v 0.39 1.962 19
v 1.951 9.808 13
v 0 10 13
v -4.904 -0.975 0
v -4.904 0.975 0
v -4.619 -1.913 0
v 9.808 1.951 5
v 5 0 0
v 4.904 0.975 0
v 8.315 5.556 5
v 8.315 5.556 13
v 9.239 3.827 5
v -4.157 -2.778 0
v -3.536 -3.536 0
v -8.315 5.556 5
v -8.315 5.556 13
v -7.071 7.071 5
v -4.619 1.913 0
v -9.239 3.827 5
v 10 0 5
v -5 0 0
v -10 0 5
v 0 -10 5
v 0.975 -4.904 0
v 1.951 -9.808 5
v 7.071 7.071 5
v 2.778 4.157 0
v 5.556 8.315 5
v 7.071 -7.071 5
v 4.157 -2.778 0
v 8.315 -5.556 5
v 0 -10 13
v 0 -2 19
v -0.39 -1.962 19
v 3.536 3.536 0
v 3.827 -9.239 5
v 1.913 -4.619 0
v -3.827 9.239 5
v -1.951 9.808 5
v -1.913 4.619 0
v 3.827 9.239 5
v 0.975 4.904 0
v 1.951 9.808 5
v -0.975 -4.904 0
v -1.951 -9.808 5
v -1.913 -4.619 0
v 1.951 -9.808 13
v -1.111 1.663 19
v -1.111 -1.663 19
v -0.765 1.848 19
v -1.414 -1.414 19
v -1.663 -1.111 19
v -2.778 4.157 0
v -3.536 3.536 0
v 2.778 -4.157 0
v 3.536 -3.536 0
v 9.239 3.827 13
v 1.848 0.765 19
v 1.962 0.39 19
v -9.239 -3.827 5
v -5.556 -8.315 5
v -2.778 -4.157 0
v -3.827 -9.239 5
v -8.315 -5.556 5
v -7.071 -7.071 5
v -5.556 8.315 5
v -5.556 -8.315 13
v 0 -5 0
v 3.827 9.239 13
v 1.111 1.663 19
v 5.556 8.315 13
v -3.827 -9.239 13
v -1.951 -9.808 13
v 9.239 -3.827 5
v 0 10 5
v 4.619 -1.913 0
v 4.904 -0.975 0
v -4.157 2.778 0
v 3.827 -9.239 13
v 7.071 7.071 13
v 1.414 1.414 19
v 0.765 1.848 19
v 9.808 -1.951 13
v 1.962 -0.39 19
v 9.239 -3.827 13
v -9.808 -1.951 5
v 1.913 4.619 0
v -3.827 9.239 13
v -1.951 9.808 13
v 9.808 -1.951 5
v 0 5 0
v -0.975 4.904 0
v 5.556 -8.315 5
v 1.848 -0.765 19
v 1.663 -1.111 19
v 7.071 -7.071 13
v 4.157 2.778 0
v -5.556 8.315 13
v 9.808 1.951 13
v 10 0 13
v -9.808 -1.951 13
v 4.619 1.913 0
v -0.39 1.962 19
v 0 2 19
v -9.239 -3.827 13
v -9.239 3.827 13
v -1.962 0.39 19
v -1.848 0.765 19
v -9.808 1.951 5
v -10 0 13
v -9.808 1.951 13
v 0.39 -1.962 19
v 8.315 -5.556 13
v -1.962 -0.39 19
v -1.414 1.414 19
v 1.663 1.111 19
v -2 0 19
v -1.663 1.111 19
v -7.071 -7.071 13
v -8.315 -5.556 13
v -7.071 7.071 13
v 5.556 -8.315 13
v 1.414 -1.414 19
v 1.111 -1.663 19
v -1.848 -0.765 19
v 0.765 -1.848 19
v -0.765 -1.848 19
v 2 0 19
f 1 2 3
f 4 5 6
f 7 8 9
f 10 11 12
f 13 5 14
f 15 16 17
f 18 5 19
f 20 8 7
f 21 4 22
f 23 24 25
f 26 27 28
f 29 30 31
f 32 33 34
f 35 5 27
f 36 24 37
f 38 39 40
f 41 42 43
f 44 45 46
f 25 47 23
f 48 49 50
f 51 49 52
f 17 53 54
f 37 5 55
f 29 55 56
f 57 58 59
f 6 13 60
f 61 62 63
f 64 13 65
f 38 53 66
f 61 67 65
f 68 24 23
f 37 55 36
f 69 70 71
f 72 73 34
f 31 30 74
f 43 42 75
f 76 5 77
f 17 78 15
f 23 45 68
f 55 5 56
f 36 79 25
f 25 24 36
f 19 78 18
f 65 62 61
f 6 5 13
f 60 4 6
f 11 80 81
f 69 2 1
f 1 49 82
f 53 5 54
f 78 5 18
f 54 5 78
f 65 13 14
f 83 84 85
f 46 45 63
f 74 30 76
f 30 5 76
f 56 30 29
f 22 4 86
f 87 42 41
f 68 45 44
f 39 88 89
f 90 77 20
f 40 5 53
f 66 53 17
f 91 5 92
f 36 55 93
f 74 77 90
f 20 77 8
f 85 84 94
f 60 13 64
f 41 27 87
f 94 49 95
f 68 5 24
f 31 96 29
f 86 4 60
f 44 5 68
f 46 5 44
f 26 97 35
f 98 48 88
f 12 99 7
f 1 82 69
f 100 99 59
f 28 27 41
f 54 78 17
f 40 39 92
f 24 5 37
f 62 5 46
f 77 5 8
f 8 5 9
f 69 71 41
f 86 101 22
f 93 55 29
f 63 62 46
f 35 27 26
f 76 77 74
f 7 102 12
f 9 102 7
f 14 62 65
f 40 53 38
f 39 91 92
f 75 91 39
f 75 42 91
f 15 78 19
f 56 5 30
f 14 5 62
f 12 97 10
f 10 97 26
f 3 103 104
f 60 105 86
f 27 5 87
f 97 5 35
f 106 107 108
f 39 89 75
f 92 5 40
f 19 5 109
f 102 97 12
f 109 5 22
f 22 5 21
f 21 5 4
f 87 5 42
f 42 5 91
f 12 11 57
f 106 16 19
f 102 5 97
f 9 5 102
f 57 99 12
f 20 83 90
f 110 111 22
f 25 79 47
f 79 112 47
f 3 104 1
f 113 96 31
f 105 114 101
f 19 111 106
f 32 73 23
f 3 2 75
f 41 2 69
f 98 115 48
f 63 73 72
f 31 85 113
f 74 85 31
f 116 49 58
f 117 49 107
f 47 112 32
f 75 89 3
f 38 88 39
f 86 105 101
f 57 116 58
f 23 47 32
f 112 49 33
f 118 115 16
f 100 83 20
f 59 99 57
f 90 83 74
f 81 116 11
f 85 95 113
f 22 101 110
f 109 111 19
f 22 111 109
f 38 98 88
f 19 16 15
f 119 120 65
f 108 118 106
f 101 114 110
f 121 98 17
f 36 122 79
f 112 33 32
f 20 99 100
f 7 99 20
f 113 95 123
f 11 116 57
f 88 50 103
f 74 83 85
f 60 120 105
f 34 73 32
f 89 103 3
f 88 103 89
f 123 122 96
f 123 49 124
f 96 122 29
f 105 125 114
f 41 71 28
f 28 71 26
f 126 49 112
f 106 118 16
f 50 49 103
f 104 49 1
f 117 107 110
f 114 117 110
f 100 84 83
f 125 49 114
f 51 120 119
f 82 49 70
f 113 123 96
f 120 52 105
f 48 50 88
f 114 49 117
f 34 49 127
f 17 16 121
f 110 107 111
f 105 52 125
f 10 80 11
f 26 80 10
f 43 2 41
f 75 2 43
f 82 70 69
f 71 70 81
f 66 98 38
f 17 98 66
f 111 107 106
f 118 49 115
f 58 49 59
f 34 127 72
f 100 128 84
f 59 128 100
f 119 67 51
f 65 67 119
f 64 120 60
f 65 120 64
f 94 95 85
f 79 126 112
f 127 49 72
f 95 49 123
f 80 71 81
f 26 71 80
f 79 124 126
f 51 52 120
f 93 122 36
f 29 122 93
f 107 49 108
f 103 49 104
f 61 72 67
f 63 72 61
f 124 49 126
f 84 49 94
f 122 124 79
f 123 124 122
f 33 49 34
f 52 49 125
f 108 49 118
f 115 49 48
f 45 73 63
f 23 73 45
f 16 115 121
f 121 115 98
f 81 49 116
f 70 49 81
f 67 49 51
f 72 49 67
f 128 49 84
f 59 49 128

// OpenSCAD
// Simple hull test: 3 cylinders along Z-axis
$fn = 32; // low resolution for testing

hull() {
    // Cylinder 1
    cylinder(h=5, r1=5, r2=5, center=false);

    // Cylinder 2, offset in Z
    translate([0,0,5])
        cylinder(h=8, r1=10, r2=10, center=false);

    // Cylinder 3, further offset
    translate([0,0,13])
        cylinder(h=6, r1=2, r2=2, center=false);
}
